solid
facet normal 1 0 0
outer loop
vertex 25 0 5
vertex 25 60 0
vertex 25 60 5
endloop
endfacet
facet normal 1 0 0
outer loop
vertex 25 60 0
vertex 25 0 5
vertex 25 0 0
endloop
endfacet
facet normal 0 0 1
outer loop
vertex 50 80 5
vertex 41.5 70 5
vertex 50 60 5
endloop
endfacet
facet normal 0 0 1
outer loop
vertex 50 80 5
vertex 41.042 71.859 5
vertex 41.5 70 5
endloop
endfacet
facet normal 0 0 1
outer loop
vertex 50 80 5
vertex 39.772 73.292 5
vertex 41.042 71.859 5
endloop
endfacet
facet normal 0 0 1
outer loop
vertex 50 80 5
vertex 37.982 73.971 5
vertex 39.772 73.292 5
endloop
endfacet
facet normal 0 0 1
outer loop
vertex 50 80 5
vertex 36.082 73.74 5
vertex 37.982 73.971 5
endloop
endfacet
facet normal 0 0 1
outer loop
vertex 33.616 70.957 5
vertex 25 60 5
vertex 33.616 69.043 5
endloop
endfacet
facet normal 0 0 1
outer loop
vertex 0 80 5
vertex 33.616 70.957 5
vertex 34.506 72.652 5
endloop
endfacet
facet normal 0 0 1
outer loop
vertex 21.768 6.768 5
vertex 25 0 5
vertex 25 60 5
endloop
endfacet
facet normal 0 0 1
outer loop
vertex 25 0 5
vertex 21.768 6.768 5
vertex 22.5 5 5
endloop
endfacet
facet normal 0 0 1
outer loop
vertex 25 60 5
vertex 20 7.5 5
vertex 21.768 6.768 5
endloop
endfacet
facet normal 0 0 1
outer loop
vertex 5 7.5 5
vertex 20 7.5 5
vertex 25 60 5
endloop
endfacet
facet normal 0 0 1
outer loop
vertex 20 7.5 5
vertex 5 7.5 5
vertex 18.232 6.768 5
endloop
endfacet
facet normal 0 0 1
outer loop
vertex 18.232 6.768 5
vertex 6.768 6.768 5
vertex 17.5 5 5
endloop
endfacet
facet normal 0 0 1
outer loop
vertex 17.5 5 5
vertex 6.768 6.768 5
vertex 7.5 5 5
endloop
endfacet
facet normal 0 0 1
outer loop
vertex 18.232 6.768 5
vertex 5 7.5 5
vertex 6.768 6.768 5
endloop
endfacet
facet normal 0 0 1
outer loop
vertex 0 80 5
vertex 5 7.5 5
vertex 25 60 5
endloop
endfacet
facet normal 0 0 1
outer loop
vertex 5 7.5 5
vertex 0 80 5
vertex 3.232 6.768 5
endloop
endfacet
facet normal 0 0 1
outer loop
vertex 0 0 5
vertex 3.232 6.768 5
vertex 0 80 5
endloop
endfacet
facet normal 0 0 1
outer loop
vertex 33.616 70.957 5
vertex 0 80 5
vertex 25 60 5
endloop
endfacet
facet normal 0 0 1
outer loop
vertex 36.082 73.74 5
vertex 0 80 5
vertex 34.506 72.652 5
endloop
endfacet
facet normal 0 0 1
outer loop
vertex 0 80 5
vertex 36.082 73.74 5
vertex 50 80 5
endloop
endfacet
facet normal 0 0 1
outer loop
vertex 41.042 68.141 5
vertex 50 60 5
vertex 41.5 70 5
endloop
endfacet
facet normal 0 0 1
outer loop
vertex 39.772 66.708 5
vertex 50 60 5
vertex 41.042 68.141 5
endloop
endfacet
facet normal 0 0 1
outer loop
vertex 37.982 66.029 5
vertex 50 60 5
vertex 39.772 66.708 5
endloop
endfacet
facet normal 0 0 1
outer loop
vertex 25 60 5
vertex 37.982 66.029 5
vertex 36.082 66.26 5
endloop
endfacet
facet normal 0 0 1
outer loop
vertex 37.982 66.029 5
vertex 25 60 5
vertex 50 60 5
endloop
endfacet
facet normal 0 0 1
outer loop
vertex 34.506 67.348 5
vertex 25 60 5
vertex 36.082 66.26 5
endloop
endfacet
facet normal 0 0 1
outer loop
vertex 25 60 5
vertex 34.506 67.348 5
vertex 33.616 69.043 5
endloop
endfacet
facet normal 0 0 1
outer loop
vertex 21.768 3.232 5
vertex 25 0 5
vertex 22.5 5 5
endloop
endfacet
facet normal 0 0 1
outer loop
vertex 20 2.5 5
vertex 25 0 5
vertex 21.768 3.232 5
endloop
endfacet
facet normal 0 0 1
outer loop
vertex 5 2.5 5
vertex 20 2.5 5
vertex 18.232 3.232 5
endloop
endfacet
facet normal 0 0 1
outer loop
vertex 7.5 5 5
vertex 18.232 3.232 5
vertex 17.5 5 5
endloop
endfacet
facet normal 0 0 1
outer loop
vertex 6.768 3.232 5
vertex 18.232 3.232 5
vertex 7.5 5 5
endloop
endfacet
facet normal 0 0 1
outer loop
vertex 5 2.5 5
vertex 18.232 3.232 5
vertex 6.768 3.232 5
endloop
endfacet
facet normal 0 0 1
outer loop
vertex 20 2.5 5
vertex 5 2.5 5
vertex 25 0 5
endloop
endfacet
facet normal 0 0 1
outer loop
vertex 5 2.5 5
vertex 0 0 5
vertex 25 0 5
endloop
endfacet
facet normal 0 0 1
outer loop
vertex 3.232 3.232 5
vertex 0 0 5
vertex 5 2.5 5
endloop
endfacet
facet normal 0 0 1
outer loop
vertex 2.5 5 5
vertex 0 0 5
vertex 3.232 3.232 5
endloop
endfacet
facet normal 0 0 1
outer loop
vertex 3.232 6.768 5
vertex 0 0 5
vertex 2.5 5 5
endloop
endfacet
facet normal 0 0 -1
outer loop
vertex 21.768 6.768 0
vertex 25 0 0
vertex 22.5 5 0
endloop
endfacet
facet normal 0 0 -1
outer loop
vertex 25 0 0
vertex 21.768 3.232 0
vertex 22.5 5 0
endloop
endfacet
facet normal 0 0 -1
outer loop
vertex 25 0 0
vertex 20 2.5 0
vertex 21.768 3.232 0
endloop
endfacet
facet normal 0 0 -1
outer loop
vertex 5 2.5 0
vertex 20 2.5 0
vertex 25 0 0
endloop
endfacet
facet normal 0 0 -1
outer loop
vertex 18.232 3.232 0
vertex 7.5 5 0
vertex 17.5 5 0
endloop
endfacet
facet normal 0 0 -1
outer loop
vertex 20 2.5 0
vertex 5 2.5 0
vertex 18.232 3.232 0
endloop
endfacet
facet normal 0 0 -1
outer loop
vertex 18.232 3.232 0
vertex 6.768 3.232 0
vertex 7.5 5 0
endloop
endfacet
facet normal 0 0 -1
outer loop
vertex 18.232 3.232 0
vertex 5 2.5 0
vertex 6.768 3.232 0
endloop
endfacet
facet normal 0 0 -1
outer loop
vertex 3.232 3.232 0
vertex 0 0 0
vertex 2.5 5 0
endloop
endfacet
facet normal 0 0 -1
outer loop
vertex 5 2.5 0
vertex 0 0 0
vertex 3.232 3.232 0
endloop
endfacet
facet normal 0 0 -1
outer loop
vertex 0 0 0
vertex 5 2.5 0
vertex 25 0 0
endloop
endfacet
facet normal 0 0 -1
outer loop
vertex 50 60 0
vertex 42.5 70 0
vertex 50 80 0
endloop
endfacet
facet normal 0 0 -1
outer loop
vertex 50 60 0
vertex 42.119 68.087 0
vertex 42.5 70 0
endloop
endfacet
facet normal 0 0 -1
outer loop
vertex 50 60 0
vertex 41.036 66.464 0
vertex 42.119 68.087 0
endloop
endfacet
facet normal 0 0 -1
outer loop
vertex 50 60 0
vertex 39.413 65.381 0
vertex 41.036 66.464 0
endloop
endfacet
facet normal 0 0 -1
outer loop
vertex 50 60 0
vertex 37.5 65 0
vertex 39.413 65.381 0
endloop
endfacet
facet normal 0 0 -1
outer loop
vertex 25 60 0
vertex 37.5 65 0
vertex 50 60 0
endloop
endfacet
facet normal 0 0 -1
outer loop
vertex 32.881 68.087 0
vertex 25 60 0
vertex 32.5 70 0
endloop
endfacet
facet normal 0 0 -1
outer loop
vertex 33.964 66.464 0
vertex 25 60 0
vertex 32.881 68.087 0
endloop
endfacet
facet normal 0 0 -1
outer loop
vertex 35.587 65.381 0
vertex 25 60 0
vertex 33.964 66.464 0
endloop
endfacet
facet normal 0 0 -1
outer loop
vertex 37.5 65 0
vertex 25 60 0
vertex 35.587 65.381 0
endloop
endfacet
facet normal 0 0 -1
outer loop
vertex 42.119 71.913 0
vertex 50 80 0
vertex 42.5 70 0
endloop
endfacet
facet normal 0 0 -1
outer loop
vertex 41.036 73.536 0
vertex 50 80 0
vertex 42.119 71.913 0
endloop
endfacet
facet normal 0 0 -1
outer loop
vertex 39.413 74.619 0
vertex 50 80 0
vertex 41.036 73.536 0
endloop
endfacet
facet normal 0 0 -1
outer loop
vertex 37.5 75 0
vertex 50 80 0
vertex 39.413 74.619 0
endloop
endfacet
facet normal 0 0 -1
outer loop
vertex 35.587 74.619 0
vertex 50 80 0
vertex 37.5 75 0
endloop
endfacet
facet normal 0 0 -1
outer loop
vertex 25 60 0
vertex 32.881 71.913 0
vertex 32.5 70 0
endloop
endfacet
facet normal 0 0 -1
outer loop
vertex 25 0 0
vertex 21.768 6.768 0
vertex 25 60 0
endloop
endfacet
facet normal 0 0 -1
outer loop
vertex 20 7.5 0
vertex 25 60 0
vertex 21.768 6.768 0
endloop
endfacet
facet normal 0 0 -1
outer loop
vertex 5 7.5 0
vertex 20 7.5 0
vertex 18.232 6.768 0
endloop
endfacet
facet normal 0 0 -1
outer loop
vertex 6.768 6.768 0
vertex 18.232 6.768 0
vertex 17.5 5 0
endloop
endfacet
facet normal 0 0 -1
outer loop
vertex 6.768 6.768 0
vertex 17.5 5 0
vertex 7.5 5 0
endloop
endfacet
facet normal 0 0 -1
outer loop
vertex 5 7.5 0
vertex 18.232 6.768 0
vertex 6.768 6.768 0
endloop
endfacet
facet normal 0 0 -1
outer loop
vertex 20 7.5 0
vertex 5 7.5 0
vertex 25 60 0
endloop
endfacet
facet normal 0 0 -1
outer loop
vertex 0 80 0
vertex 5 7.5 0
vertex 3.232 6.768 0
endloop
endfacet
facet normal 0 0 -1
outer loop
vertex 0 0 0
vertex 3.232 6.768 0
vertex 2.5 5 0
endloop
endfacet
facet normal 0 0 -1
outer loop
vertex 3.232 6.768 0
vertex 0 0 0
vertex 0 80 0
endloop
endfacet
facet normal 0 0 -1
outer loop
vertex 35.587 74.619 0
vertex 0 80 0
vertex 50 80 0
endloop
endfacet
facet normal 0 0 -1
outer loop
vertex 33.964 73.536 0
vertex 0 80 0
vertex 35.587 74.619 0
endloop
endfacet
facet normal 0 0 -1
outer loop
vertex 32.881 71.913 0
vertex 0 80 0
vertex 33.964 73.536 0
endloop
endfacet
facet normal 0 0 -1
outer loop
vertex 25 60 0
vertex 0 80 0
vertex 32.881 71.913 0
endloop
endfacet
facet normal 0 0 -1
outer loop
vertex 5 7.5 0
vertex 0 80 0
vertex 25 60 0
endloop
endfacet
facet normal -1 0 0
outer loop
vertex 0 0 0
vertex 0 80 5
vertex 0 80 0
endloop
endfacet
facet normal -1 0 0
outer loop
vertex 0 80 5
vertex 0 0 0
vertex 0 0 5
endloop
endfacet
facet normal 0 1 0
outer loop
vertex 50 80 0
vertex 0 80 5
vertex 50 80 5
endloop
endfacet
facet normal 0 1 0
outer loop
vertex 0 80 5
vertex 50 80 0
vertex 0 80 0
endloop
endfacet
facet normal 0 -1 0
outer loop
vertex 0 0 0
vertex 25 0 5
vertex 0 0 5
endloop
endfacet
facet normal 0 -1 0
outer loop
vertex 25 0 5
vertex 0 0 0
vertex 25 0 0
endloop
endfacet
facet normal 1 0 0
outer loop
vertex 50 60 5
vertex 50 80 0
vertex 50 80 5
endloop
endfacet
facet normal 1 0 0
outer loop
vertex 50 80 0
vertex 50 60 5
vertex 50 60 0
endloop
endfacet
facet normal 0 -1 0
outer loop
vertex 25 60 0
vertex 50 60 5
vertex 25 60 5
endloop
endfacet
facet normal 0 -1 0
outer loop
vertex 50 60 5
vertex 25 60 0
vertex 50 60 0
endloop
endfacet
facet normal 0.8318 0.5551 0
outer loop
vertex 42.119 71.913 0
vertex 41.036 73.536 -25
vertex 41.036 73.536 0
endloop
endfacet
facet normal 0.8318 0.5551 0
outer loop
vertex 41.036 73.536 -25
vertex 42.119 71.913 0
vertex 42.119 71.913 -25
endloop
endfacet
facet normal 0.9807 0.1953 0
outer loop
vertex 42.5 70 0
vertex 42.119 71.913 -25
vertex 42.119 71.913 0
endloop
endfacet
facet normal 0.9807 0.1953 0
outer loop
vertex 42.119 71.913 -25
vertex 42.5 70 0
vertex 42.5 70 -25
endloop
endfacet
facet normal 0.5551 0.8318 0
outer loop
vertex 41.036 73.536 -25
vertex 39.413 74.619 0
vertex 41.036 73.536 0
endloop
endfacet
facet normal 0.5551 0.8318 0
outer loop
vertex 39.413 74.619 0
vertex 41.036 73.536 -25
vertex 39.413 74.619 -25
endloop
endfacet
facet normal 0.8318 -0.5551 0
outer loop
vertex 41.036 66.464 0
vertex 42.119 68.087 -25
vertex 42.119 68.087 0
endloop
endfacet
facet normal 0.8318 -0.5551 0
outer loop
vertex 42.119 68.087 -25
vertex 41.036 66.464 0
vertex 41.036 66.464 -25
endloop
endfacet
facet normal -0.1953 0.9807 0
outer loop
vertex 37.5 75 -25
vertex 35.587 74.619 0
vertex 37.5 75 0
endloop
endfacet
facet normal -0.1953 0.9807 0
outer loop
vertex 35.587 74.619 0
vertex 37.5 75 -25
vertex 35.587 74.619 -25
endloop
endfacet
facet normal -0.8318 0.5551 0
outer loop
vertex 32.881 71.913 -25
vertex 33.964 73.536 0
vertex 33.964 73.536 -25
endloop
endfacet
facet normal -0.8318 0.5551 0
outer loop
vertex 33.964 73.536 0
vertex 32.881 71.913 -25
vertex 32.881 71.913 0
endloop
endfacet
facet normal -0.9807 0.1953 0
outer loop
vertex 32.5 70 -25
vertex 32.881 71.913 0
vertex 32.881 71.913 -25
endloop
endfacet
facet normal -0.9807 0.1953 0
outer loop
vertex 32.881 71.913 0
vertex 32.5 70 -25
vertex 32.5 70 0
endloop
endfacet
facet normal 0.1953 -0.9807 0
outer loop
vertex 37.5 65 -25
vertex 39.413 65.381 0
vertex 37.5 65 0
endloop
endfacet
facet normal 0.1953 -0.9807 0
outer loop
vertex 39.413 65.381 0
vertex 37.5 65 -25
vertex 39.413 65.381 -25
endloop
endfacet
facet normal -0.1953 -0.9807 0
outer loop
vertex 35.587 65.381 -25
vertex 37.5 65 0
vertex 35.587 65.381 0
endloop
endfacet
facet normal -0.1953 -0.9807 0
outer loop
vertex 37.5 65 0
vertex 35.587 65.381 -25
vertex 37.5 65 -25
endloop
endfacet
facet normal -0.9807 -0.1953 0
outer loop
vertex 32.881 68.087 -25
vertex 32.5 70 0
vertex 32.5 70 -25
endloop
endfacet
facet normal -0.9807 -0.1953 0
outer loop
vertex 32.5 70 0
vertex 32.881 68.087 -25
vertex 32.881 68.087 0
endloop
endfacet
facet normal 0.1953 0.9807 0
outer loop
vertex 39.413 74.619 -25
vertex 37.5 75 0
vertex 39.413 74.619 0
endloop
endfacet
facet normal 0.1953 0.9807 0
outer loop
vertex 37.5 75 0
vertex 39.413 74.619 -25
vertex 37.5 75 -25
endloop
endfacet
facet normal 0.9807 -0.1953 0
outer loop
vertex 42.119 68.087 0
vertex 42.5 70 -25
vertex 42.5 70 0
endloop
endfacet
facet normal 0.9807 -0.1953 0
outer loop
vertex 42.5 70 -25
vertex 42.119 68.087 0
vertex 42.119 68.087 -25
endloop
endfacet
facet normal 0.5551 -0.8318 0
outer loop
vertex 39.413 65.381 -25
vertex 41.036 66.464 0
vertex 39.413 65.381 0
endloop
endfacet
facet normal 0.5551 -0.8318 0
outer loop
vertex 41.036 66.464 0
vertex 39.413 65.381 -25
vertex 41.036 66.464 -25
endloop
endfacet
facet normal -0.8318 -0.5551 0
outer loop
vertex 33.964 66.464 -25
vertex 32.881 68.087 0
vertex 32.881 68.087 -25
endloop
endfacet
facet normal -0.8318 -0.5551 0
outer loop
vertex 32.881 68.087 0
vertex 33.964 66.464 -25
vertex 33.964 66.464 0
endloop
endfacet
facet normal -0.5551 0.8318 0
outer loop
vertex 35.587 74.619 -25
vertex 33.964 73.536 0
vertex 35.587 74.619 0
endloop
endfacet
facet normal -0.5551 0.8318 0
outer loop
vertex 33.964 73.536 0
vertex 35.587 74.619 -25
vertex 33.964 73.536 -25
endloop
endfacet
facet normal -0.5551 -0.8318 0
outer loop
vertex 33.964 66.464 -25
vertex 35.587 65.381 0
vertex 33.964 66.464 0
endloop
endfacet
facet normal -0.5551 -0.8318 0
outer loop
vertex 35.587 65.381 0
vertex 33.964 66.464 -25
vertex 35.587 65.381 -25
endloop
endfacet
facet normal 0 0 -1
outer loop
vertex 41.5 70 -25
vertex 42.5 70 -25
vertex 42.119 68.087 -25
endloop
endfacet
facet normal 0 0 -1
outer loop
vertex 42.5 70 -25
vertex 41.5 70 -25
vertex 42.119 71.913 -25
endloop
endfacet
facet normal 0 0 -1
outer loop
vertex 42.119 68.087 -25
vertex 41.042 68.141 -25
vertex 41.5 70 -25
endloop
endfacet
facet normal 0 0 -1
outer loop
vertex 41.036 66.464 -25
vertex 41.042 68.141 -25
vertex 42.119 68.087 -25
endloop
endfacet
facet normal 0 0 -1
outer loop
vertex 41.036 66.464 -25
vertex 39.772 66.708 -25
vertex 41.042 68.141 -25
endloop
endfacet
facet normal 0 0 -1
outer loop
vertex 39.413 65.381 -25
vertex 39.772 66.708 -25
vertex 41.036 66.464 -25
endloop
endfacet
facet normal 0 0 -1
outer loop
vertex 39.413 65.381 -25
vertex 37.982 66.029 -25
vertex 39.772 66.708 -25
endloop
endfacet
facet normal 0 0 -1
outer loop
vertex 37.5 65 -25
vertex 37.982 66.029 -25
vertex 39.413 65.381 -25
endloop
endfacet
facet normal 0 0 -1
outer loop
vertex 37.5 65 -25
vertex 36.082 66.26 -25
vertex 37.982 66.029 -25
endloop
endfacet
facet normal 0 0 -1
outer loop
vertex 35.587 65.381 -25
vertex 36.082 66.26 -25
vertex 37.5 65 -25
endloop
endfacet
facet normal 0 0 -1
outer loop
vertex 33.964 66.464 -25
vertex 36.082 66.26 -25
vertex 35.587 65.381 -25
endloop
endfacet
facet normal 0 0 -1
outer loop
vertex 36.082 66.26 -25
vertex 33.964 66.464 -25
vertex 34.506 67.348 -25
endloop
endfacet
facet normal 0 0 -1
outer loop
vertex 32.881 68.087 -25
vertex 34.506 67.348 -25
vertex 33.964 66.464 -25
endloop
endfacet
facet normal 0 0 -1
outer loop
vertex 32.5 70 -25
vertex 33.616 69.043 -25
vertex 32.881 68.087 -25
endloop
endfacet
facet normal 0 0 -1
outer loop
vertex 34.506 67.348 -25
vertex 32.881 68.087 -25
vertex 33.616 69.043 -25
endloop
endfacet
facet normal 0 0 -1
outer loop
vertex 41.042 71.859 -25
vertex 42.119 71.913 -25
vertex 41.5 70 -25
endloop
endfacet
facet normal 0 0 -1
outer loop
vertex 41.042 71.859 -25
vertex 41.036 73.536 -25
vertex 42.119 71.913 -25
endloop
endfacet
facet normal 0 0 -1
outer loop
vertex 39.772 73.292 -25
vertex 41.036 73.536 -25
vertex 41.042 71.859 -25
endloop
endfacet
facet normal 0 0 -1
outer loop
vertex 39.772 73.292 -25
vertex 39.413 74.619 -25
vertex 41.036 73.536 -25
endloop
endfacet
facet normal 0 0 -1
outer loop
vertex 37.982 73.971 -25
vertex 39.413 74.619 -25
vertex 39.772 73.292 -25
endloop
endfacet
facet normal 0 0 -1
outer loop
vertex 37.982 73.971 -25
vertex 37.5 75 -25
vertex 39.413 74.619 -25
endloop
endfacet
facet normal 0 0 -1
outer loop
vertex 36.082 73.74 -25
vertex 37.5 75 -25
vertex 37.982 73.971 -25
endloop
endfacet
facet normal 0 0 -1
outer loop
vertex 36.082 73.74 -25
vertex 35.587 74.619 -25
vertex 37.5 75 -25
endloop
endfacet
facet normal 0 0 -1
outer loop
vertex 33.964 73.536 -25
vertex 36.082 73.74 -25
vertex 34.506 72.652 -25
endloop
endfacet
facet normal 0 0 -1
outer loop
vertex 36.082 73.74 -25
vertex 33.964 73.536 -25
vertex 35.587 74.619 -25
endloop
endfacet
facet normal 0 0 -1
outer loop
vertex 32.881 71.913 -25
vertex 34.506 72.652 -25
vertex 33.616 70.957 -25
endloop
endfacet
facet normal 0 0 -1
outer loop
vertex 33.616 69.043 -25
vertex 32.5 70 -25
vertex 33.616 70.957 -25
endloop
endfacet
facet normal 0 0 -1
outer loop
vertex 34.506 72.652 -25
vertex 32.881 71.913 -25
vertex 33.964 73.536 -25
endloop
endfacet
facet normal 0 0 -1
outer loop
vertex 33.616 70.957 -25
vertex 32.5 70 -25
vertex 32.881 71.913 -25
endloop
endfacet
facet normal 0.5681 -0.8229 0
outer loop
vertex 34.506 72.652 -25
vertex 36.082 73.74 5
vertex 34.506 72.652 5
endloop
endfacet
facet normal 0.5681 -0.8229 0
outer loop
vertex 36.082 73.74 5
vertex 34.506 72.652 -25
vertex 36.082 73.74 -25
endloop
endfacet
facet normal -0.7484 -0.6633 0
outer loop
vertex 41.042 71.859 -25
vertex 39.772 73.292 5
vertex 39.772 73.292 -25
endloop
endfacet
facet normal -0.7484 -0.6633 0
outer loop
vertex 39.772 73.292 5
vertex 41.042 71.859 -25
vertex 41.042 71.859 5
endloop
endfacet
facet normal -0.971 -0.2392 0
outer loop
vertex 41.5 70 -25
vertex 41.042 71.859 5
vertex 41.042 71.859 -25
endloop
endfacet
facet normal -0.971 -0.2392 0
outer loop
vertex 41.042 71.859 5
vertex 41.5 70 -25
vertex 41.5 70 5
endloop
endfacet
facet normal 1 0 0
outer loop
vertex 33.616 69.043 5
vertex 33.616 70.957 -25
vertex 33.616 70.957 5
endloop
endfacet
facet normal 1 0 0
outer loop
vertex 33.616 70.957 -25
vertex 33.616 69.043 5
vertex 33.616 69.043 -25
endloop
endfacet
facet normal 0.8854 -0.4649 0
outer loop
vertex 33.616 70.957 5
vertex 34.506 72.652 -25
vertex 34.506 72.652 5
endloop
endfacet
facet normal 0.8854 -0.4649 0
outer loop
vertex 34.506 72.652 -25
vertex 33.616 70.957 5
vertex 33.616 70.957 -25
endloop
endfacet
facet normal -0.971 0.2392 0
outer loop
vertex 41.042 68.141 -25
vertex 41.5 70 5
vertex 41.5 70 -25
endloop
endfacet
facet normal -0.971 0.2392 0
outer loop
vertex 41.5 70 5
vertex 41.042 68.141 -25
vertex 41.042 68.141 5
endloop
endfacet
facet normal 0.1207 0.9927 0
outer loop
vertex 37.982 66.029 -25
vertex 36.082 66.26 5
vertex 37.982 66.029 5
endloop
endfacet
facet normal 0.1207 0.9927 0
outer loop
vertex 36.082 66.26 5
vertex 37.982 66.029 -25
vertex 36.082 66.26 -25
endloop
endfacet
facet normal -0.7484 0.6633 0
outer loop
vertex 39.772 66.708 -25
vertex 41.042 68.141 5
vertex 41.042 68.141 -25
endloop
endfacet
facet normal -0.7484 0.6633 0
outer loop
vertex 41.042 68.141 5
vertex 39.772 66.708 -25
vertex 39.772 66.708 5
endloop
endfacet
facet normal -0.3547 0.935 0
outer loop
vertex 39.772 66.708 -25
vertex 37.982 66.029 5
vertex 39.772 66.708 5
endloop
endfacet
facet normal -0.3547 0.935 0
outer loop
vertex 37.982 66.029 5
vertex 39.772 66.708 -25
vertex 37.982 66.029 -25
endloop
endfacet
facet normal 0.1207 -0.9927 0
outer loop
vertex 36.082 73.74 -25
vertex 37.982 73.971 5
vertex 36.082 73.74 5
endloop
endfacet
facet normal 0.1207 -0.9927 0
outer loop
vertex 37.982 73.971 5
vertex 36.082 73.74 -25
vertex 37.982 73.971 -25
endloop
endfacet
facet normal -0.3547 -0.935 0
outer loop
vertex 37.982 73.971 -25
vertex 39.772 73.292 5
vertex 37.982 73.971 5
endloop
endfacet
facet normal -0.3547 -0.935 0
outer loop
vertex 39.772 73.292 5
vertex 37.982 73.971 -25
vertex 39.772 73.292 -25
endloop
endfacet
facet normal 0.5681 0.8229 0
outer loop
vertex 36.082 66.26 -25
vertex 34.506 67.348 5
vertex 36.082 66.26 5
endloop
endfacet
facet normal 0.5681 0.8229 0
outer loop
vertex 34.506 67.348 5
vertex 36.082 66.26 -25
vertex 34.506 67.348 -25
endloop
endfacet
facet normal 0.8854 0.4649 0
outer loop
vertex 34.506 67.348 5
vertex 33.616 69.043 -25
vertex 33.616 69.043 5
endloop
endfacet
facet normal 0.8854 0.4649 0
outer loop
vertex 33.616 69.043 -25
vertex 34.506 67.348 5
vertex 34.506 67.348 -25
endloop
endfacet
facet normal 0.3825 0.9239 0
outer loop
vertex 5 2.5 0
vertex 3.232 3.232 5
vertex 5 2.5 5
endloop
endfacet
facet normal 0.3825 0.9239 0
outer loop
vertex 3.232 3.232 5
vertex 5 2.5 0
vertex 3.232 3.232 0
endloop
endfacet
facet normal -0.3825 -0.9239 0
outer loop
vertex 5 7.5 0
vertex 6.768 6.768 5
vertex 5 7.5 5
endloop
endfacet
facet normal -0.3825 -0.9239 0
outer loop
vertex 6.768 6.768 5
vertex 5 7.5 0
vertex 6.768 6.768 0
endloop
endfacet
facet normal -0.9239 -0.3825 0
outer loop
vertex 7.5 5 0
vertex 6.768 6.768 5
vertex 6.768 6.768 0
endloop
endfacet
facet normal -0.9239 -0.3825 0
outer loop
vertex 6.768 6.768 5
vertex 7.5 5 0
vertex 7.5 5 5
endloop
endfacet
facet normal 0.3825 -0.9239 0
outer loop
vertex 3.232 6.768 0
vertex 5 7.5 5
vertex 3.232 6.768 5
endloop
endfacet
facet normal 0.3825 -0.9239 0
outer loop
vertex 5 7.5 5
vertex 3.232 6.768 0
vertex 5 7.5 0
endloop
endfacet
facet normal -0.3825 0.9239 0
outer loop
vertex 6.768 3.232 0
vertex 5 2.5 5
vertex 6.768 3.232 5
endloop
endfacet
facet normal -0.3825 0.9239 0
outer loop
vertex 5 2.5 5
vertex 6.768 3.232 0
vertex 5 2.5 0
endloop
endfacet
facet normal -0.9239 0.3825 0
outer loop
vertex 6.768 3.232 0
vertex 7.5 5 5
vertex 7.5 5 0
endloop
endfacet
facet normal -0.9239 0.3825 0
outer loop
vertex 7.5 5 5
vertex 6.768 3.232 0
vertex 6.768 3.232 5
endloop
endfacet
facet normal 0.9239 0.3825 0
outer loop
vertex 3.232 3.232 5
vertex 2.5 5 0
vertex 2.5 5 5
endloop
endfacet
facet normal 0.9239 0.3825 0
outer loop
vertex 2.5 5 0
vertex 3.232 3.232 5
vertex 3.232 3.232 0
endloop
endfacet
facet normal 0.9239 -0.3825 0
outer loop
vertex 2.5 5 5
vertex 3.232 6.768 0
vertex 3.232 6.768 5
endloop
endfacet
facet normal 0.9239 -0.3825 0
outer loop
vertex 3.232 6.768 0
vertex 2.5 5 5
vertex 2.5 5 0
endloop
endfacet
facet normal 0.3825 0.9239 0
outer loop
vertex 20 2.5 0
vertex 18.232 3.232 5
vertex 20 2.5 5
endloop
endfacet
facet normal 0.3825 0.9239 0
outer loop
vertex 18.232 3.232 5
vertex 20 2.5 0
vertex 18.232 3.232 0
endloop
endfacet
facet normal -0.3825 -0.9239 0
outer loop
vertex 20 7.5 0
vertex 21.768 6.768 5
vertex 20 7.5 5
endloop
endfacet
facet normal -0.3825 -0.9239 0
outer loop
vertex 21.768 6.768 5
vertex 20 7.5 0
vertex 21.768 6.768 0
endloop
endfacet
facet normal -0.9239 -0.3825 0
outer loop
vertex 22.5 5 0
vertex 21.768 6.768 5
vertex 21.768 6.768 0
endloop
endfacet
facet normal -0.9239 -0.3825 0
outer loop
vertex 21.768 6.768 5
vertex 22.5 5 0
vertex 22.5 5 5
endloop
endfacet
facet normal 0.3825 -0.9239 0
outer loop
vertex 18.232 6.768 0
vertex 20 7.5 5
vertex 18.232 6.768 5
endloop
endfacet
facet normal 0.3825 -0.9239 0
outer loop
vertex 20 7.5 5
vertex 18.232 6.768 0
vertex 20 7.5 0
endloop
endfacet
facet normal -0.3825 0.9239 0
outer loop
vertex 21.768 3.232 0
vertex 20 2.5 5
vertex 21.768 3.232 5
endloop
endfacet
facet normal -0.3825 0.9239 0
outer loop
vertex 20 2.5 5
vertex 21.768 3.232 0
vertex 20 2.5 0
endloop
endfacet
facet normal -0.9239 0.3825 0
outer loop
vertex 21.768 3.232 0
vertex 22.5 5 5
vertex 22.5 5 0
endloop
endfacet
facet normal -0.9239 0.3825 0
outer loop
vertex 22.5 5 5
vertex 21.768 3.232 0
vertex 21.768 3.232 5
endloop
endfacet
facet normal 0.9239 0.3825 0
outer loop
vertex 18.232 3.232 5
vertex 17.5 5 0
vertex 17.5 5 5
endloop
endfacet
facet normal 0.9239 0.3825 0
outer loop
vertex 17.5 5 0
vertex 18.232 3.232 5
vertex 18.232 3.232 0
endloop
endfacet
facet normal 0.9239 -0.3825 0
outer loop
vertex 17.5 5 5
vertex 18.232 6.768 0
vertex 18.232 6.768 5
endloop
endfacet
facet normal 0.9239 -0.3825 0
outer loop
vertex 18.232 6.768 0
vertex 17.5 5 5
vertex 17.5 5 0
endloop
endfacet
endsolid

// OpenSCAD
difference() {
    union() {
        cube([25, 80, 5]);
        translate([25, 60, 0])
            cube([25, 20, 5]);
        translate([37.5, 70, -25])
            cylinder(h=30, r=5);
    }
    translate([37.5, 70, -25])
        cylinder(h=30, r=4);
    translate([5, 5, 0])
        cylinder(h=5, r=2.5);
    translate([20, 5, 0])
        cylinder(h=5, r=2.5);
}
